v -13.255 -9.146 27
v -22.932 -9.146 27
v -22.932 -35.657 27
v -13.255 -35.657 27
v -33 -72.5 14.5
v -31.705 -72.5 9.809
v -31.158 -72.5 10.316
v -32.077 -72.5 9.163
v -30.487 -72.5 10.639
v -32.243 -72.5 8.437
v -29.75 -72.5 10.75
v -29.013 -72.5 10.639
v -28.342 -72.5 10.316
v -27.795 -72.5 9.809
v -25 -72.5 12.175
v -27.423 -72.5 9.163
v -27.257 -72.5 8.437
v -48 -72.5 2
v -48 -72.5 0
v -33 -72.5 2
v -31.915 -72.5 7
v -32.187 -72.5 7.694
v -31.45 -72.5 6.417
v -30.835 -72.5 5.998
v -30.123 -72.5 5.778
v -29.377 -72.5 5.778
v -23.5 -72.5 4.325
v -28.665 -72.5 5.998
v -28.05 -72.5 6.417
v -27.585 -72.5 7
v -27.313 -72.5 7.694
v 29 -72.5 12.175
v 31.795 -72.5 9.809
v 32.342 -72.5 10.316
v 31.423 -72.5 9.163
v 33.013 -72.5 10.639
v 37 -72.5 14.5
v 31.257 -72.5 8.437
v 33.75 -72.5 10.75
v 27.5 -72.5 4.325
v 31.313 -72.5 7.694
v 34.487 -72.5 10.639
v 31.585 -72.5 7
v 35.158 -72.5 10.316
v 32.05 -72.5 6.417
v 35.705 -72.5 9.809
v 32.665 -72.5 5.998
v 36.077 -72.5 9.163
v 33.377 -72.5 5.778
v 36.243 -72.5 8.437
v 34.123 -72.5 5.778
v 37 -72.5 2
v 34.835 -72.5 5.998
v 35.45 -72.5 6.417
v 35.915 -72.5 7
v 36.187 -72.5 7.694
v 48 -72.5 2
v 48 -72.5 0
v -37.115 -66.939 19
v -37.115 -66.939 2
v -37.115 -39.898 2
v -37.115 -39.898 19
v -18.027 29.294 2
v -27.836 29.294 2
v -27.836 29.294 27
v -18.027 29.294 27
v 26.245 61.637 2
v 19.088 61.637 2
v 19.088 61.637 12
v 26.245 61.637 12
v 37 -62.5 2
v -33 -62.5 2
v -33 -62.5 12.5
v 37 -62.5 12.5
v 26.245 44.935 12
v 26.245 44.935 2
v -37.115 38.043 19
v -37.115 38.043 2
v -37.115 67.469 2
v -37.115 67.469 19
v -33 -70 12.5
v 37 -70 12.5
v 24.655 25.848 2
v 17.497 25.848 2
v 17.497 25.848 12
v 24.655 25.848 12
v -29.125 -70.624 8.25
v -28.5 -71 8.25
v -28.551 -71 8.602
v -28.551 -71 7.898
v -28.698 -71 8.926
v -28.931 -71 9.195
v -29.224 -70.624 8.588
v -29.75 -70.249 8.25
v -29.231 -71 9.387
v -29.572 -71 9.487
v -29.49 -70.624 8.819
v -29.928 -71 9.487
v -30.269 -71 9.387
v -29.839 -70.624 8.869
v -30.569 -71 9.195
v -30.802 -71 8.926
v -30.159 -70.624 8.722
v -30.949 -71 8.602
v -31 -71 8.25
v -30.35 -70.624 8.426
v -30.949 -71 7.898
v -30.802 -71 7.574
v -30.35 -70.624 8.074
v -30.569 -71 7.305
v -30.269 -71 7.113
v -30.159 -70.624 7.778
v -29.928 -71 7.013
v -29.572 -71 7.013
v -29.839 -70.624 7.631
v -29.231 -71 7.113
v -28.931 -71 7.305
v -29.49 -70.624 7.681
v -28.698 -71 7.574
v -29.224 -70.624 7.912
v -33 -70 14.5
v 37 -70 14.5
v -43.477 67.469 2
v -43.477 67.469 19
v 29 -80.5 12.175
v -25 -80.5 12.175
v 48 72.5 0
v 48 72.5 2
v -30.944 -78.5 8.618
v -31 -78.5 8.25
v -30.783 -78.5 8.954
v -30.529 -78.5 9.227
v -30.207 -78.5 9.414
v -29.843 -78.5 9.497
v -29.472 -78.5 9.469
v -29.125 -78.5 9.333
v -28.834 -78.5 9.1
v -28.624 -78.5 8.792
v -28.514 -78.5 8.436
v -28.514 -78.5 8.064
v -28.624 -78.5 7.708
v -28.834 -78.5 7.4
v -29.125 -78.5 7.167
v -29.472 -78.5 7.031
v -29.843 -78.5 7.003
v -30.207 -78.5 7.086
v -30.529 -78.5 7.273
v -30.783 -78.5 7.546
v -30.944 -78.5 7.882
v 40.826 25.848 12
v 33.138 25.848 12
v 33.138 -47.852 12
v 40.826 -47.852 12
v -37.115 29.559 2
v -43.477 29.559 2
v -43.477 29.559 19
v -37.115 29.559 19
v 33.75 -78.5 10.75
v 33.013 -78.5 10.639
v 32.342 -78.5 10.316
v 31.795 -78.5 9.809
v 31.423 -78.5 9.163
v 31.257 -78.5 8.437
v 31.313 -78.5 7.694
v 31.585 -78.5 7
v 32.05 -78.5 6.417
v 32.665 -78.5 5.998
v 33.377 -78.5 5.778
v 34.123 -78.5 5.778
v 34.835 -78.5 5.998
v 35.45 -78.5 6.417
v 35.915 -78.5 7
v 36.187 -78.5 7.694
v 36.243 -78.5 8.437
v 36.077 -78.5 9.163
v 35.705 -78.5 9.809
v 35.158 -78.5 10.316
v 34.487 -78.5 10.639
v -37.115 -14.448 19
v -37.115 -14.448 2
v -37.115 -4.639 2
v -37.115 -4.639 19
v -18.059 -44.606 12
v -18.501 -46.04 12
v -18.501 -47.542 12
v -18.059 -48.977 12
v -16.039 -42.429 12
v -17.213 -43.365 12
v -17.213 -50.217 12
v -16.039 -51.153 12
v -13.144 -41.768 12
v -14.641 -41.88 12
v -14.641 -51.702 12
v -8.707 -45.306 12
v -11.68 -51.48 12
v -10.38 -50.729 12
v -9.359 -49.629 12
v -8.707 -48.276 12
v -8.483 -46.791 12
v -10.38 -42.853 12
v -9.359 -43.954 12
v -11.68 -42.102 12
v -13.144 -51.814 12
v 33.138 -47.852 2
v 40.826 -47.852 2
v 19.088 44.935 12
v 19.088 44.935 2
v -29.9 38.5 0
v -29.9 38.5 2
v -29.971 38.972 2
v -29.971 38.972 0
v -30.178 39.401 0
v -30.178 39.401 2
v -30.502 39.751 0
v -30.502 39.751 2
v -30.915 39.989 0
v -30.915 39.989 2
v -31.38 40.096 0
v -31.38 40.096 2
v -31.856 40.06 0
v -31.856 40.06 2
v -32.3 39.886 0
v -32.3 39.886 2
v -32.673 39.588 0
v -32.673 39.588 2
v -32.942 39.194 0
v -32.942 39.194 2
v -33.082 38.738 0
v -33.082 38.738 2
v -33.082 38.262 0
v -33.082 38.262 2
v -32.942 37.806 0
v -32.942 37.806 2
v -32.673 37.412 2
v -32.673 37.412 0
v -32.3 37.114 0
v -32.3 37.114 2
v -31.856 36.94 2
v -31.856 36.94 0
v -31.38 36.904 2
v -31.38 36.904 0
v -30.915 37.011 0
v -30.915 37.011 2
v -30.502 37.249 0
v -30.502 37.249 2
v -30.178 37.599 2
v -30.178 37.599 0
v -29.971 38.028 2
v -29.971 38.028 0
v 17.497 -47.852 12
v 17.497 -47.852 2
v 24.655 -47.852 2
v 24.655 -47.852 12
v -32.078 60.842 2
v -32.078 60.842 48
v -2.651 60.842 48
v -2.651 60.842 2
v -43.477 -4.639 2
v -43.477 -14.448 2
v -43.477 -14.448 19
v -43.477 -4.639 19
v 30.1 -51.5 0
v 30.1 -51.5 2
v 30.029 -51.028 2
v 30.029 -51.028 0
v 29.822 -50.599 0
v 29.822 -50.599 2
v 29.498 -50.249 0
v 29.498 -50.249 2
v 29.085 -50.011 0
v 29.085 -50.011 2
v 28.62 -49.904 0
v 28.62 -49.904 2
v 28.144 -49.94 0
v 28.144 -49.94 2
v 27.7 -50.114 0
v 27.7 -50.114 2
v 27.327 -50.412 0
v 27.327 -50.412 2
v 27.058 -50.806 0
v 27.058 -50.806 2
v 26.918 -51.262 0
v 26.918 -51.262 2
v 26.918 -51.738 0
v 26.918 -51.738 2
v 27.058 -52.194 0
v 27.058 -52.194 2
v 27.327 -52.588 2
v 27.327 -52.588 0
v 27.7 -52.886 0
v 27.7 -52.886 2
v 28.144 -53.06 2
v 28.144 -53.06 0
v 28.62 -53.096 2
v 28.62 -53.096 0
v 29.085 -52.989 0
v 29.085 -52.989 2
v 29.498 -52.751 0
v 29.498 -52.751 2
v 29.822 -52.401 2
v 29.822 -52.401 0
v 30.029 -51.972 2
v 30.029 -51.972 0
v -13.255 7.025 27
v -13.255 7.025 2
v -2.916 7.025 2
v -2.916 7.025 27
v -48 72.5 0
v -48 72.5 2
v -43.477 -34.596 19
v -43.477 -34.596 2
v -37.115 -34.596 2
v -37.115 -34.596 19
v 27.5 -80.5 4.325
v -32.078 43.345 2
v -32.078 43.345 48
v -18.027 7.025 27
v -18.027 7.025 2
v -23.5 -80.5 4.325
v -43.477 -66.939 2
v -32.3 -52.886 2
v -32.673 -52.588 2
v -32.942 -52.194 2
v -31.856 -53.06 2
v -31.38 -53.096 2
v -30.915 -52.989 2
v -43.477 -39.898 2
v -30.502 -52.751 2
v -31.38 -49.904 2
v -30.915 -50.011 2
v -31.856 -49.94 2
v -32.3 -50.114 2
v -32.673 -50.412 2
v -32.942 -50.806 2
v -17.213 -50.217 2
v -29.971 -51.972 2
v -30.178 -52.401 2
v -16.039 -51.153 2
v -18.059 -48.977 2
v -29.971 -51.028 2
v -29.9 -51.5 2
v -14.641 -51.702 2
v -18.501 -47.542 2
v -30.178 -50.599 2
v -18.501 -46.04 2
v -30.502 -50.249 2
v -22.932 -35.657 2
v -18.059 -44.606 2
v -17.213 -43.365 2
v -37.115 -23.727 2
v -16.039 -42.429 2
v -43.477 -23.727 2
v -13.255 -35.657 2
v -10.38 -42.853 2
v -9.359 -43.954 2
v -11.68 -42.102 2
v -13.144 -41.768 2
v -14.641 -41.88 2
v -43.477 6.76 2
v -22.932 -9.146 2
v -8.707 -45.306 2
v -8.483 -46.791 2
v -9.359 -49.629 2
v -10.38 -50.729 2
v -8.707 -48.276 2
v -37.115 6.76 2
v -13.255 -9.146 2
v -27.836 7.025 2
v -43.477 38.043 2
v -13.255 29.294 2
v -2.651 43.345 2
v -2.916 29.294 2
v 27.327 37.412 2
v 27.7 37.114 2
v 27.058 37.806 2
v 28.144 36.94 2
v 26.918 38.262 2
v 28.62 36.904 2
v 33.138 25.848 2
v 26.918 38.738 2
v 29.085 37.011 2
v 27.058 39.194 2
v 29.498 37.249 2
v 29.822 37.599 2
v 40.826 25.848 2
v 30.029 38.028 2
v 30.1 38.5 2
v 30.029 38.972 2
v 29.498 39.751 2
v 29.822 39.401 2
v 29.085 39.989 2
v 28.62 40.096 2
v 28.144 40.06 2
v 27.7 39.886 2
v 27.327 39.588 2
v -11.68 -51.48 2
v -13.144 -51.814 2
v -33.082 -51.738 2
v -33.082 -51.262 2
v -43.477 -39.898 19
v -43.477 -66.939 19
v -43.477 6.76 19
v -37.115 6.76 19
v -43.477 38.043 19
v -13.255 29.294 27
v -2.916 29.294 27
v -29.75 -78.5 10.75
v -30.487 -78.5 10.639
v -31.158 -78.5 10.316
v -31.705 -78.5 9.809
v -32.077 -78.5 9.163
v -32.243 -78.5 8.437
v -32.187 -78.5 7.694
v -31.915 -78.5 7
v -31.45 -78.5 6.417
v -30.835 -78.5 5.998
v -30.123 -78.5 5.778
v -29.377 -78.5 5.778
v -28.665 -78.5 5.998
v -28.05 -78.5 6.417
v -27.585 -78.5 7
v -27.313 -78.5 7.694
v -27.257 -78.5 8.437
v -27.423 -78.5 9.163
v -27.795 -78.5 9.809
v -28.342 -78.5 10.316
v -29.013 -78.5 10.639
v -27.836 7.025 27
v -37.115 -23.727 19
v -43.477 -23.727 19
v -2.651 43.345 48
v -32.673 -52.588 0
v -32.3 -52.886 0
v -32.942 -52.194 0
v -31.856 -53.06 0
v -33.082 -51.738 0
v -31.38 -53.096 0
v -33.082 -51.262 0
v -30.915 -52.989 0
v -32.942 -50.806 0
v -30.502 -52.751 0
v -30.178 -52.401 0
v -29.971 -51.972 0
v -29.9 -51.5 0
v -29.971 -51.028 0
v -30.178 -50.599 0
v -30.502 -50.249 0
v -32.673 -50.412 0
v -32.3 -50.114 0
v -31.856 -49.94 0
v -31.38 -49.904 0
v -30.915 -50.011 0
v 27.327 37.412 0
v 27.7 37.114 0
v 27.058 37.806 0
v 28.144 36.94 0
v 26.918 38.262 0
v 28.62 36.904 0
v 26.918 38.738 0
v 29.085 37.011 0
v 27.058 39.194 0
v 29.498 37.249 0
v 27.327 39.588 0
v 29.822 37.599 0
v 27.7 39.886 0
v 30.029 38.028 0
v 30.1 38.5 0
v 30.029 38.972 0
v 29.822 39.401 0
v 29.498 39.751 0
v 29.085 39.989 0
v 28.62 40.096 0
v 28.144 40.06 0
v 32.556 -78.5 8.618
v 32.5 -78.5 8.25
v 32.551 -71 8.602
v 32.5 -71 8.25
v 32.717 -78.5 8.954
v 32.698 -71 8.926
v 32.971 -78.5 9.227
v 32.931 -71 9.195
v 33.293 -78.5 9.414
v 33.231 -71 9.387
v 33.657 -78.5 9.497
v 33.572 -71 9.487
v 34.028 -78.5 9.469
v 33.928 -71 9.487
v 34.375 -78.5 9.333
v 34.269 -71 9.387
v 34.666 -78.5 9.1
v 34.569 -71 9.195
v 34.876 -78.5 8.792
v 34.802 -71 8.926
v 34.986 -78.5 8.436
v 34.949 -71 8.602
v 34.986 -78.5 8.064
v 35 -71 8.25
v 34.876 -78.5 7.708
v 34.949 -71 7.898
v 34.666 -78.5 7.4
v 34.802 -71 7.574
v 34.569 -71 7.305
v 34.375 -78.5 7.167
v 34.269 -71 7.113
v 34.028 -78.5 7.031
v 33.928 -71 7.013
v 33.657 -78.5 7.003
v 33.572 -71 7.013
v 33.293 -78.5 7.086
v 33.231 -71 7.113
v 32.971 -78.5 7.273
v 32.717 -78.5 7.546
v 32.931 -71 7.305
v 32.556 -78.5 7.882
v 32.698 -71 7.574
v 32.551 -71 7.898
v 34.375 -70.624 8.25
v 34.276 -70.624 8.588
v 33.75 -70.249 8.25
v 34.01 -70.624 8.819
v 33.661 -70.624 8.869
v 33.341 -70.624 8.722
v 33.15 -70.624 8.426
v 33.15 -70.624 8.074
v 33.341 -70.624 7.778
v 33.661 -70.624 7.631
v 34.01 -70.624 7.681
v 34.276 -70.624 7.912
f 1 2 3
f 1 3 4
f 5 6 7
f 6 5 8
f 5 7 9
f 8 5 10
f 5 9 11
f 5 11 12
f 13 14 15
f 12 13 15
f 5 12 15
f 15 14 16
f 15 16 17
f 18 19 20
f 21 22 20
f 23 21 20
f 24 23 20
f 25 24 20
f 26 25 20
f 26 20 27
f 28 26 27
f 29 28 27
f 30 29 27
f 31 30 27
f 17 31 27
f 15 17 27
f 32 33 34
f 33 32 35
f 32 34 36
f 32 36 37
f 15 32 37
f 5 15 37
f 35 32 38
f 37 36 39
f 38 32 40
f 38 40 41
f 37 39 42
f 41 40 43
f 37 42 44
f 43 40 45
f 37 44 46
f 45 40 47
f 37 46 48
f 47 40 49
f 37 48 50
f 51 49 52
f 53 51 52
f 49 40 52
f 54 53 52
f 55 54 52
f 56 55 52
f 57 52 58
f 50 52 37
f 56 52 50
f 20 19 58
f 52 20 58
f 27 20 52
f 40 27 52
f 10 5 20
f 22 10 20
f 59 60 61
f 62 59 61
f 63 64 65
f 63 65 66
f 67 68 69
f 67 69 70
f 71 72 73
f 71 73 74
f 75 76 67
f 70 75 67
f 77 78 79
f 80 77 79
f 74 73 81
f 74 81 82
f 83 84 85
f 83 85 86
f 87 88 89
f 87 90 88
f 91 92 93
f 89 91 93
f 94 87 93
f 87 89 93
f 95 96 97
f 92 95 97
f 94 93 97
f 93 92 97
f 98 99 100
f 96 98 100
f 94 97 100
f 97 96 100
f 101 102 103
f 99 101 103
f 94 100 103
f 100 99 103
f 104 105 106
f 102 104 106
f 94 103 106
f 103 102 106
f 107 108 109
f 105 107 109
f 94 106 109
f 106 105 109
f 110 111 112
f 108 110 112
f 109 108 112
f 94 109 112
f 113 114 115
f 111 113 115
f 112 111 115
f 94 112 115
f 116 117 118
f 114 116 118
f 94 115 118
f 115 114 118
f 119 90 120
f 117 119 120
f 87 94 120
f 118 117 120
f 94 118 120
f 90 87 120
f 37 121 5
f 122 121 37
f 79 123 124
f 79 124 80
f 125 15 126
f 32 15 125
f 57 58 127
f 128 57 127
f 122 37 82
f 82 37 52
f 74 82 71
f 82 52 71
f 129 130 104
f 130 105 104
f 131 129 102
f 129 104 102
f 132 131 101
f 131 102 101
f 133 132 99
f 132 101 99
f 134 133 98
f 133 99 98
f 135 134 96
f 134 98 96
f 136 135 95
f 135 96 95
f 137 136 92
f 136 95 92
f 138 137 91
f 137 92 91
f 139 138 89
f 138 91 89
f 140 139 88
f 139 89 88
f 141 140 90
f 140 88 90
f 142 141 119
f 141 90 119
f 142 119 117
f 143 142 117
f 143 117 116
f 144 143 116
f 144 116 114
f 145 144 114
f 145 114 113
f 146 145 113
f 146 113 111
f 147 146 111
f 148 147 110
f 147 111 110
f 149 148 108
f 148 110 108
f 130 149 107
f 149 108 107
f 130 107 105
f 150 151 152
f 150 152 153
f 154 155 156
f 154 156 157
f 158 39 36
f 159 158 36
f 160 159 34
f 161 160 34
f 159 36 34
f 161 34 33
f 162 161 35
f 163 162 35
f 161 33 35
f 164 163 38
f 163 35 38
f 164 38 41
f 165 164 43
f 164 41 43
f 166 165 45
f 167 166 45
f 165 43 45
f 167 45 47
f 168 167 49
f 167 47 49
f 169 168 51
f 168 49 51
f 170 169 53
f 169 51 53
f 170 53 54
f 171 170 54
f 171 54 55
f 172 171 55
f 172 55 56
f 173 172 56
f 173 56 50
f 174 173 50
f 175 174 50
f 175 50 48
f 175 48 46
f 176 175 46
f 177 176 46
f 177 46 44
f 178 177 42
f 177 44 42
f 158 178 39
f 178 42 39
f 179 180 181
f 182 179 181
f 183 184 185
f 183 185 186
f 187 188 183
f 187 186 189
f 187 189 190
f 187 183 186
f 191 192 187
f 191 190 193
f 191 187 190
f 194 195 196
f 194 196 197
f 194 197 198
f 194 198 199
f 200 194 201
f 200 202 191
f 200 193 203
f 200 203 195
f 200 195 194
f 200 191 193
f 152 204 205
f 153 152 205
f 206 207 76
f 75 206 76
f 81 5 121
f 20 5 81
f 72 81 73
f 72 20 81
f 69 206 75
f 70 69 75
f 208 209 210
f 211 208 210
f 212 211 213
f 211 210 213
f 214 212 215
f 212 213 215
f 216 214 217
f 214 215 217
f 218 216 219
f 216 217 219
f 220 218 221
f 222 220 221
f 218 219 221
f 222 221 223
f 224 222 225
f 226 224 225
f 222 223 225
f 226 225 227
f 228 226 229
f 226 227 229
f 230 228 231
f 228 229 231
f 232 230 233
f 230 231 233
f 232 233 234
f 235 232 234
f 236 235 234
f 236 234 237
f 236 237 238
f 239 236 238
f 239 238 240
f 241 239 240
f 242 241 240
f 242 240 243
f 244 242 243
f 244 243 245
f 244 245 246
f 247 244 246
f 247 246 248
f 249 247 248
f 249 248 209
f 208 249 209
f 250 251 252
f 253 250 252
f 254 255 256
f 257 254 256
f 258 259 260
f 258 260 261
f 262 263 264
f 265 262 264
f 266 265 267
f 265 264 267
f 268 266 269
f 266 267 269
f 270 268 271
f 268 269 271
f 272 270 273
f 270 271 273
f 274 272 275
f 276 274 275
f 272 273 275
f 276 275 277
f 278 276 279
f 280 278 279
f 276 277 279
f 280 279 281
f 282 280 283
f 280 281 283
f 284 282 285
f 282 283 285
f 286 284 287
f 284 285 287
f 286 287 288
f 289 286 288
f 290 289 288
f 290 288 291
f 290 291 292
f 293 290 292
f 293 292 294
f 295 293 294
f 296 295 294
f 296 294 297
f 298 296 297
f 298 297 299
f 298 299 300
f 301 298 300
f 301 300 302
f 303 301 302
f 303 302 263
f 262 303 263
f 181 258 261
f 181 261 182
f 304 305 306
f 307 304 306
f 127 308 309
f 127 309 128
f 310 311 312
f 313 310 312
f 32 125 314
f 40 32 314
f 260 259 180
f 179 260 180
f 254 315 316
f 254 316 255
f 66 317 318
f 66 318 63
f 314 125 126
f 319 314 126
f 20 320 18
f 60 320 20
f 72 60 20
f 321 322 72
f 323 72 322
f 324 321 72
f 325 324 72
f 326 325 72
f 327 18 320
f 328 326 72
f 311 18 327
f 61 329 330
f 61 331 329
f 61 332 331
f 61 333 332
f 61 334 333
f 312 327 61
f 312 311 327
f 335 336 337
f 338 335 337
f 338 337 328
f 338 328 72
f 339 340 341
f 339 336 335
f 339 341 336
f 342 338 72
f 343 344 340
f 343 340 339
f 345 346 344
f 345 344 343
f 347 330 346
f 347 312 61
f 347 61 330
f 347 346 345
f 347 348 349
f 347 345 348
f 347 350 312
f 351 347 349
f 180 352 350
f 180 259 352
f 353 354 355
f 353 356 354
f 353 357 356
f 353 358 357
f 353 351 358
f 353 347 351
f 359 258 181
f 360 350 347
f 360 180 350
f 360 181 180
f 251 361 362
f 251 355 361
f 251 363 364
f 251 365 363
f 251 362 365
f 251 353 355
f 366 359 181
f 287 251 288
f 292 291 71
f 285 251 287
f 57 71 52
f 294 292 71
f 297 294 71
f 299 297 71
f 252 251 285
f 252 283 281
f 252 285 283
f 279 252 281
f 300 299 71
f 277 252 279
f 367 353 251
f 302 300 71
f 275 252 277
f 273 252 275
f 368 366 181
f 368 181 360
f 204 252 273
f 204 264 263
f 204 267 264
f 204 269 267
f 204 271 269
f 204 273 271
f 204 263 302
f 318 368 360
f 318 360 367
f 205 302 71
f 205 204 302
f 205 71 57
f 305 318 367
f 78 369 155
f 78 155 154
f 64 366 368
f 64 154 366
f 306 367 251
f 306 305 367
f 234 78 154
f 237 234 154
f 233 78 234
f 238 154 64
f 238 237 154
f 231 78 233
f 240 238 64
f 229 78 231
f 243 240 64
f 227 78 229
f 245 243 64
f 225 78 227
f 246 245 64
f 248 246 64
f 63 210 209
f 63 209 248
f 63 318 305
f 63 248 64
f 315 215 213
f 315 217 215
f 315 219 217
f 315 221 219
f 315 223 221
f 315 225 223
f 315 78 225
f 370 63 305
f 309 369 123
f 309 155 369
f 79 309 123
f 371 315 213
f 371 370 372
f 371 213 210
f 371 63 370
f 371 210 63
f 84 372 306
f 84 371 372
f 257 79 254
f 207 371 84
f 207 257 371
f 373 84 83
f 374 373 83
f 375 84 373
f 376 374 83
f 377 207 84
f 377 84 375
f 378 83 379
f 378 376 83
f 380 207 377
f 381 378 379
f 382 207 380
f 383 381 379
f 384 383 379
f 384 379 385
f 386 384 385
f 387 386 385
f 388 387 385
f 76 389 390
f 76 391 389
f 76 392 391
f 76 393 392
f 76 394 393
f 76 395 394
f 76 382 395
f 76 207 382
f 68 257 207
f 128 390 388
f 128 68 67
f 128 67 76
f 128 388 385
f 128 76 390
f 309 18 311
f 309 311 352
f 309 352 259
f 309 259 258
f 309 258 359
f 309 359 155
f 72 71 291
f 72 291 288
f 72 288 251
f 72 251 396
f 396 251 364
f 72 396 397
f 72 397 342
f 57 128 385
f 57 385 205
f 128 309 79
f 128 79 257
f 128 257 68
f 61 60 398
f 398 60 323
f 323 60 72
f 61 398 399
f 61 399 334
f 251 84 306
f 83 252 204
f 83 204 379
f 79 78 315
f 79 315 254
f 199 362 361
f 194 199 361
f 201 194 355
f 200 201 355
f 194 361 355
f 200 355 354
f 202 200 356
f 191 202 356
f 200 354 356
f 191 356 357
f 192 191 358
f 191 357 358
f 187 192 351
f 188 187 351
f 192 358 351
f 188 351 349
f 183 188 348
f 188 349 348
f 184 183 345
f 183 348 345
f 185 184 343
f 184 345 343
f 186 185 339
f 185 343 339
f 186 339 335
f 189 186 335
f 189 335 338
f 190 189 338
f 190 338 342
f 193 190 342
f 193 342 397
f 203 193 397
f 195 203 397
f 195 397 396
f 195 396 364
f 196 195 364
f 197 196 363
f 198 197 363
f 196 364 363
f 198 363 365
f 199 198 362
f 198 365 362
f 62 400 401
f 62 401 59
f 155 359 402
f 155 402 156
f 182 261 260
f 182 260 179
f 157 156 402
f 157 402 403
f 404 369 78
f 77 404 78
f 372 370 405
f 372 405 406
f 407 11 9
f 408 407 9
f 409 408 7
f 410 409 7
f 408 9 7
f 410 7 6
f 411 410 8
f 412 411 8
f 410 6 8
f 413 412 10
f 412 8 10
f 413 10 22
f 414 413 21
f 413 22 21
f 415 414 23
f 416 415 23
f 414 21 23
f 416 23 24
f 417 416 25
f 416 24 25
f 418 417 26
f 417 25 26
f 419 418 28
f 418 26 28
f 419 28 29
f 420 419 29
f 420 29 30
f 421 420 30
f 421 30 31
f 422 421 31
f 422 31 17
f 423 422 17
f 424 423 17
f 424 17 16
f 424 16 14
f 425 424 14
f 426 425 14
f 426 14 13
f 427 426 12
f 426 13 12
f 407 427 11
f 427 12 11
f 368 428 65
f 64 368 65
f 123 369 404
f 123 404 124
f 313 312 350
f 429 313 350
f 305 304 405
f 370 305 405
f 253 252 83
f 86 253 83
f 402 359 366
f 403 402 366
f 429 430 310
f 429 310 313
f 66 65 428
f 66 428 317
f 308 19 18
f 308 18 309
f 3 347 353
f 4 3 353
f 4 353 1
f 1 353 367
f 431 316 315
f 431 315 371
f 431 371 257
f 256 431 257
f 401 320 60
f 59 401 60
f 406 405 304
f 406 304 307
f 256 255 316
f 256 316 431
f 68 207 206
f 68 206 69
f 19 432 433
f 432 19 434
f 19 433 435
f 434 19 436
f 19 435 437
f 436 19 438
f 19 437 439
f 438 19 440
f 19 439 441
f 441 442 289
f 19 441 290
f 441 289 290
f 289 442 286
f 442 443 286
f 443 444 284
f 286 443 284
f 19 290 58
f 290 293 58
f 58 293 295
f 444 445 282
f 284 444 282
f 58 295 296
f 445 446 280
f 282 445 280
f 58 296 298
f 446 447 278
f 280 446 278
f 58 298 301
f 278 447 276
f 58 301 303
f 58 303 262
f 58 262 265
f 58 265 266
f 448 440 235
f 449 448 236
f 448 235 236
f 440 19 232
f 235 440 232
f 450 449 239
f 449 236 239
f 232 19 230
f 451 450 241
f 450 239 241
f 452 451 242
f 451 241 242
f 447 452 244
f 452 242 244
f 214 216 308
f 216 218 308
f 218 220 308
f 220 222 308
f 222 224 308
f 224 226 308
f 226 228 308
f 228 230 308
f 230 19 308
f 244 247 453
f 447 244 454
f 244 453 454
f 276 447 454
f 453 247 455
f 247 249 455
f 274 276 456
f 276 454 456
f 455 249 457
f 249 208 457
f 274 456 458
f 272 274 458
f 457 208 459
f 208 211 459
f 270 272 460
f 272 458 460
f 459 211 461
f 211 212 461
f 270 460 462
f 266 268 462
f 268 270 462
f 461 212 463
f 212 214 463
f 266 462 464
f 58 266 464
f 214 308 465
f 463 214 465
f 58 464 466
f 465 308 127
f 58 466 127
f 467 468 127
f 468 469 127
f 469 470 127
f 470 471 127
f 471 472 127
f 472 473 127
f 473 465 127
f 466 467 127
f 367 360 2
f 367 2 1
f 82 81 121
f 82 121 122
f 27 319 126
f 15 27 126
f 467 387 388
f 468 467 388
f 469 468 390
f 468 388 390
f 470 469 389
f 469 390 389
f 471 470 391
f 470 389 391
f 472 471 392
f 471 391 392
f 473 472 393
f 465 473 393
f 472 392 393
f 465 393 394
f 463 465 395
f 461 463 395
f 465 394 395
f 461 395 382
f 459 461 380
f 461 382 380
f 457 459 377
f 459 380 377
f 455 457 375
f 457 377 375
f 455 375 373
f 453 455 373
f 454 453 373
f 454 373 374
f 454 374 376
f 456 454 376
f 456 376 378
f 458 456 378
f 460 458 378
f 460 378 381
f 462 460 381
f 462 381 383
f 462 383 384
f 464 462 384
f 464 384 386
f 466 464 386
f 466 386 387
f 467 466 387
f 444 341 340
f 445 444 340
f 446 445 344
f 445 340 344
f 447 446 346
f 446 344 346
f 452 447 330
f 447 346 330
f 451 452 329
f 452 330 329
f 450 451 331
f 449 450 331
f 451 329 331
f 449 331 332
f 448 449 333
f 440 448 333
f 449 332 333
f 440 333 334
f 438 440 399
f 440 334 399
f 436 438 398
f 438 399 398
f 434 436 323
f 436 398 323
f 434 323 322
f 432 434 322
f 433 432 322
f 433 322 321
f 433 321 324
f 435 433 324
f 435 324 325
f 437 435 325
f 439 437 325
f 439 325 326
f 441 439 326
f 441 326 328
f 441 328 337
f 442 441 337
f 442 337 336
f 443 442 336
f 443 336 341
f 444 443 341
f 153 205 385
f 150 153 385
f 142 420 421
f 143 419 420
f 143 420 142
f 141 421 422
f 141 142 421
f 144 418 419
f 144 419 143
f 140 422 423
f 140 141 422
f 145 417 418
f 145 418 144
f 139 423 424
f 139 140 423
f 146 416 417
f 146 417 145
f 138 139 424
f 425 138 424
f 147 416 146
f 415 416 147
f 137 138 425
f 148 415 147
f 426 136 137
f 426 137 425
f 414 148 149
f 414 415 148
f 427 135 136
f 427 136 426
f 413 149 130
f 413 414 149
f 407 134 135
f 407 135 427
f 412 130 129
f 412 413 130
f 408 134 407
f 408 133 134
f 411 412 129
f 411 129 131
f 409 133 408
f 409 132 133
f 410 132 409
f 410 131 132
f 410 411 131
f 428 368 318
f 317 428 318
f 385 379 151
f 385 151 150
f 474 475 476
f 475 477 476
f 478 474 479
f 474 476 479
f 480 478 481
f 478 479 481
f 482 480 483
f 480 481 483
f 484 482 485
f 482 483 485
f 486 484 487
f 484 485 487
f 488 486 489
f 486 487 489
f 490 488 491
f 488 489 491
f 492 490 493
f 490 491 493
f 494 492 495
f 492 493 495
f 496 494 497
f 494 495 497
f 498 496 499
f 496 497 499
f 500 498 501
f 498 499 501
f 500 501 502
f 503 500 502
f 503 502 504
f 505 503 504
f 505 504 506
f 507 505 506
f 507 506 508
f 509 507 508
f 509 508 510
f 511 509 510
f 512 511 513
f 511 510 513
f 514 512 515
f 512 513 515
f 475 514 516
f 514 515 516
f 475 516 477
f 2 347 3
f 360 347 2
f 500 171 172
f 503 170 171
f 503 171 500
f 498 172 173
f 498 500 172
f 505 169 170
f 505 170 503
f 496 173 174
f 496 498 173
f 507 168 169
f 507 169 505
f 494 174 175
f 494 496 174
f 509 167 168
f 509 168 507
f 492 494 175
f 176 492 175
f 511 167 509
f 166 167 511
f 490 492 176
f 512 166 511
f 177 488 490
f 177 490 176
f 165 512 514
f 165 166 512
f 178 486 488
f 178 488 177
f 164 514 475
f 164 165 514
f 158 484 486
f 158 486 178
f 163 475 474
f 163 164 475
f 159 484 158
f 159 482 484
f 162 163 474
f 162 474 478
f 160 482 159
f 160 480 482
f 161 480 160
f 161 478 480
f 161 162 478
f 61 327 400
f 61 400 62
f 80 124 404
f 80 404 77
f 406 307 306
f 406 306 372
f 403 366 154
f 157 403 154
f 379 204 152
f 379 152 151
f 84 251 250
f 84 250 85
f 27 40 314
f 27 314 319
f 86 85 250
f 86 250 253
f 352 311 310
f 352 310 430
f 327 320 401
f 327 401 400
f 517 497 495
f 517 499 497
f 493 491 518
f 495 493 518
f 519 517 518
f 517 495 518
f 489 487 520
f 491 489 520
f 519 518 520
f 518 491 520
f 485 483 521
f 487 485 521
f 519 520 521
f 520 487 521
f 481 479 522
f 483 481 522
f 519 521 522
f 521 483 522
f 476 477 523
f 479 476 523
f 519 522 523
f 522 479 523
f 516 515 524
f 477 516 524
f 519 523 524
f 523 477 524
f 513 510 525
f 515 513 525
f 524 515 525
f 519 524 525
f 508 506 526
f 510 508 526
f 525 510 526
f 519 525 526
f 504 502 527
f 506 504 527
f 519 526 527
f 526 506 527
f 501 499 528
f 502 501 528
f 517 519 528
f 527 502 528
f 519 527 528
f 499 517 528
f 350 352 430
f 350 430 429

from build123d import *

# Parameters (mm, degrees)
SKETCH_1_W          = 96
SKETCH_1_H          = 145
EXTRUDE_1_DEPTH     = 2
SKETCH_2_W          = 6.362526911
SKETCH_2_H          = 29.426686961
SKETCH_2_H_2        = 22.799054763
SKETCH_2_H_3        = 9.808895654
SKETCH_2_H_4        = 10.869316806
SKETCH_2_H_5        = 27.04073937
EXTRUDE_2_DEPTH     = 17
SKETCH_3_W          = 29.426686961
SKETCH_3_H          = 17.496949003
EXTRUDE_3_DEPTH     = 46
SKETCH_4_W          = 9.808895653
SKETCH_4_H          = 22.268844187
SKETCH_4_W_2        = 10.33910623
SKETCH_4_W_3        = 9.676343009
SKETCH_4_H_2        = 26.510528793
EXTRUDE_4_DEPTH     = 25
SKETCH_5_R          = 5.037000471
EXTRUDE_5_DEPTH     = 10
SKETCH_6_W          = 7.157842775
SKETCH_6_H          = 16.70163314
EXTRUDE_6_DEPTH     = 10
SKETCH_7_W          = 7.157842774
SKETCH_7_H          = 73.699270047
SKETCH_7_W_2        = 7.68805335
EXTRUDE_7_DEPTH     = 10
SKETCH_8_R          = 1.6
CUT_EXTRUDE_1_DEPTH = 99.367931766
SKETCH_9_W          = 70
SKETCH_9_H          = 10
EXTRUDE_8_DEPTH     = 10.5
SKETCH_10_W         = 70
SKETCH_10_H         = 2.5
EXTRUDE_9_DEPTH     = 2
EXTRUDE_10_DEPTH    = 8
SKETCH_12_R         = 2.5
EXTRUDE_11_DEPTH    = 6
M3X0_5_1_D          = 2.5
M3X0_5_1_DEPTH      = 7.5
M3X0_5_1_TIP        = 0.751075774


with BuildPart() as part:
    # 草图1 → 凸台-拉伸1 (new body)
    with BuildSketch(Plane.XY):
        Rectangle(SKETCH_1_W, SKETCH_1_H)
    extrude(amount=EXTRUDE_1_DEPTH)

    # 草图2 → 凸台-拉伸2 (add)
    with BuildSketch(Plane.XY.offset(2)):
        with Locations((-40.296003767, 52.7559523)):
            Rectangle(SKETCH_2_W, SKETCH_2_H)
        with Locations((-40.296003767, 18.159712224)):
            Rectangle(SKETCH_2_W, SKETCH_2_H_2)
        with Locations((-40.296003767, -9.543790366)):
            Rectangle(SKETCH_2_W, SKETCH_2_H_3)
        with Locations((-40.296003767, -29.161581673)):
            Rectangle(SKETCH_2_W, SKETCH_2_H_4)
        with Locations((-40.296003767, -53.418715519)):
            Rectangle(SKETCH_2_W, SKETCH_2_H_5)
    extrude(amount=EXTRUDE_2_DEPTH)

    # 草图3 → 凸台-拉伸3 (add)
    with BuildSketch(Plane.XY.offset(2)):
        with Locations((-17.364396359, 52.09318908)):
            Rectangle(SKETCH_3_W, SKETCH_3_H)
    extrude(amount=EXTRUDE_3_DEPTH)

    # 草图4 → 凸台-拉伸4 (add)
    with BuildSketch(Plane.XY.offset(2)):
        with Locations((-22.931607407, 18.159712224)):
            Rectangle(SKETCH_4_W, SKETCH_4_H)
        with Locations((-8.085711282, 18.159712224)):
            Rectangle(SKETCH_4_W_2, SKETCH_4_H)
        with Locations((-18.093435902, -22.401396831)):
            Rectangle(SKETCH_4_W_3, SKETCH_4_H_2)
    extrude(amount=EXTRUDE_4_DEPTH)

    # 草图5 → 凸台-拉伸5 (add)
    with BuildSketch(Plane.XY.offset(2)):
        with Locations((-13.520369685, -46.791083321)):
            Circle(SKETCH_5_R)
    extrude(amount=EXTRUDE_5_DEPTH)

    # 草图6 → 凸台-拉伸6 (add)
    with BuildSketch(Plane.XY.offset(2)):
        with Locations((22.666502119, 53.286162875)):
            Rectangle(SKETCH_6_W, SKETCH_6_H)
    extrude(amount=EXTRUDE_6_DEPTH)

    # 草图7 → 凸台-拉伸7 (add)
    with BuildSketch(Plane.XY.offset(2)):
        with Locations((21.075870391, -11.00186945)):
            Rectangle(SKETCH_7_W, SKETCH_7_H)
        with Locations((36.982187667, -11.00186945)):
            Rectangle(SKETCH_7_W_2, SKETCH_7_H)
    extrude(amount=EXTRUDE_7_DEPTH)

    # 草图8 → 切除-拉伸1 (cut, through all)
    with BuildSketch(Plane.XY.offset(2)):
        with Locations((-31.5, -51.5)):
            Circle(SKETCH_8_R)
        with Locations((28.5, -51.5)):
            Circle(SKETCH_8_R)
        with Locations((-31.5, 38.5)):
            Circle(SKETCH_8_R)
        with Locations((28.5, 38.5)):
            Circle(SKETCH_8_R)
    extrude(amount=-CUT_EXTRUDE_1_DEPTH, mode=Mode.SUBTRACT)

    # 草图9 → 凸台-拉伸8 (add)
    with BuildSketch(Plane.XY.offset(2)):
        with Locations((2, -67.5)):
            Rectangle(SKETCH_9_W, SKETCH_9_H)
    extrude(amount=EXTRUDE_8_DEPTH)

    # 草图10 → 凸台-拉伸9 (add)
    with BuildSketch(Plane.XY.offset(12.5)):
        with Locations((2, -71.25)):
            Rectangle(SKETCH_10_W, SKETCH_10_H)
    extrude(amount=EXTRUDE_9_DEPTH)

    # 草图11 → 凸台-拉伸10 (add)
    with BuildSketch(Plane.XZ.offset(72.5)):
        Polygon((-25, 12.175), (29, 12.175), (27.5, 4.325), (-23.5, 4.325), align=None)
    extrude(amount=EXTRUDE_10_DEPTH)

    # 草图12 → 凸台-拉伸11 (add)
    with BuildSketch(Plane.XZ.offset(72.5)):
        with Locations(Location((-29.75, 8.25, 0), (0, 0, 90))):
            Circle(SKETCH_12_R)
        with Locations(Location((33.75, 8.25, 0), (0, 0, 90))):
            Circle(SKETCH_12_R)
    extrude(amount=EXTRUDE_11_DEPTH)

    # M3x0.5 螺纹孔1
    with Locations(Plane.XZ.offset(78.5)):
        with Locations((-29.75, 8.25), (33.75, 8.25)):
            Hole(M3X0_5_1_D / 2, depth=M3X0_5_1_DEPTH)
            with Locations((0, 0, -(M3X0_5_1_DEPTH + M3X0_5_1_TIP / 2))):  # 118° drill point
                Cone(0, M3X0_5_1_D / 2, M3X0_5_1_TIP, mode=Mode.SUBTRACT)


solid = part.part
